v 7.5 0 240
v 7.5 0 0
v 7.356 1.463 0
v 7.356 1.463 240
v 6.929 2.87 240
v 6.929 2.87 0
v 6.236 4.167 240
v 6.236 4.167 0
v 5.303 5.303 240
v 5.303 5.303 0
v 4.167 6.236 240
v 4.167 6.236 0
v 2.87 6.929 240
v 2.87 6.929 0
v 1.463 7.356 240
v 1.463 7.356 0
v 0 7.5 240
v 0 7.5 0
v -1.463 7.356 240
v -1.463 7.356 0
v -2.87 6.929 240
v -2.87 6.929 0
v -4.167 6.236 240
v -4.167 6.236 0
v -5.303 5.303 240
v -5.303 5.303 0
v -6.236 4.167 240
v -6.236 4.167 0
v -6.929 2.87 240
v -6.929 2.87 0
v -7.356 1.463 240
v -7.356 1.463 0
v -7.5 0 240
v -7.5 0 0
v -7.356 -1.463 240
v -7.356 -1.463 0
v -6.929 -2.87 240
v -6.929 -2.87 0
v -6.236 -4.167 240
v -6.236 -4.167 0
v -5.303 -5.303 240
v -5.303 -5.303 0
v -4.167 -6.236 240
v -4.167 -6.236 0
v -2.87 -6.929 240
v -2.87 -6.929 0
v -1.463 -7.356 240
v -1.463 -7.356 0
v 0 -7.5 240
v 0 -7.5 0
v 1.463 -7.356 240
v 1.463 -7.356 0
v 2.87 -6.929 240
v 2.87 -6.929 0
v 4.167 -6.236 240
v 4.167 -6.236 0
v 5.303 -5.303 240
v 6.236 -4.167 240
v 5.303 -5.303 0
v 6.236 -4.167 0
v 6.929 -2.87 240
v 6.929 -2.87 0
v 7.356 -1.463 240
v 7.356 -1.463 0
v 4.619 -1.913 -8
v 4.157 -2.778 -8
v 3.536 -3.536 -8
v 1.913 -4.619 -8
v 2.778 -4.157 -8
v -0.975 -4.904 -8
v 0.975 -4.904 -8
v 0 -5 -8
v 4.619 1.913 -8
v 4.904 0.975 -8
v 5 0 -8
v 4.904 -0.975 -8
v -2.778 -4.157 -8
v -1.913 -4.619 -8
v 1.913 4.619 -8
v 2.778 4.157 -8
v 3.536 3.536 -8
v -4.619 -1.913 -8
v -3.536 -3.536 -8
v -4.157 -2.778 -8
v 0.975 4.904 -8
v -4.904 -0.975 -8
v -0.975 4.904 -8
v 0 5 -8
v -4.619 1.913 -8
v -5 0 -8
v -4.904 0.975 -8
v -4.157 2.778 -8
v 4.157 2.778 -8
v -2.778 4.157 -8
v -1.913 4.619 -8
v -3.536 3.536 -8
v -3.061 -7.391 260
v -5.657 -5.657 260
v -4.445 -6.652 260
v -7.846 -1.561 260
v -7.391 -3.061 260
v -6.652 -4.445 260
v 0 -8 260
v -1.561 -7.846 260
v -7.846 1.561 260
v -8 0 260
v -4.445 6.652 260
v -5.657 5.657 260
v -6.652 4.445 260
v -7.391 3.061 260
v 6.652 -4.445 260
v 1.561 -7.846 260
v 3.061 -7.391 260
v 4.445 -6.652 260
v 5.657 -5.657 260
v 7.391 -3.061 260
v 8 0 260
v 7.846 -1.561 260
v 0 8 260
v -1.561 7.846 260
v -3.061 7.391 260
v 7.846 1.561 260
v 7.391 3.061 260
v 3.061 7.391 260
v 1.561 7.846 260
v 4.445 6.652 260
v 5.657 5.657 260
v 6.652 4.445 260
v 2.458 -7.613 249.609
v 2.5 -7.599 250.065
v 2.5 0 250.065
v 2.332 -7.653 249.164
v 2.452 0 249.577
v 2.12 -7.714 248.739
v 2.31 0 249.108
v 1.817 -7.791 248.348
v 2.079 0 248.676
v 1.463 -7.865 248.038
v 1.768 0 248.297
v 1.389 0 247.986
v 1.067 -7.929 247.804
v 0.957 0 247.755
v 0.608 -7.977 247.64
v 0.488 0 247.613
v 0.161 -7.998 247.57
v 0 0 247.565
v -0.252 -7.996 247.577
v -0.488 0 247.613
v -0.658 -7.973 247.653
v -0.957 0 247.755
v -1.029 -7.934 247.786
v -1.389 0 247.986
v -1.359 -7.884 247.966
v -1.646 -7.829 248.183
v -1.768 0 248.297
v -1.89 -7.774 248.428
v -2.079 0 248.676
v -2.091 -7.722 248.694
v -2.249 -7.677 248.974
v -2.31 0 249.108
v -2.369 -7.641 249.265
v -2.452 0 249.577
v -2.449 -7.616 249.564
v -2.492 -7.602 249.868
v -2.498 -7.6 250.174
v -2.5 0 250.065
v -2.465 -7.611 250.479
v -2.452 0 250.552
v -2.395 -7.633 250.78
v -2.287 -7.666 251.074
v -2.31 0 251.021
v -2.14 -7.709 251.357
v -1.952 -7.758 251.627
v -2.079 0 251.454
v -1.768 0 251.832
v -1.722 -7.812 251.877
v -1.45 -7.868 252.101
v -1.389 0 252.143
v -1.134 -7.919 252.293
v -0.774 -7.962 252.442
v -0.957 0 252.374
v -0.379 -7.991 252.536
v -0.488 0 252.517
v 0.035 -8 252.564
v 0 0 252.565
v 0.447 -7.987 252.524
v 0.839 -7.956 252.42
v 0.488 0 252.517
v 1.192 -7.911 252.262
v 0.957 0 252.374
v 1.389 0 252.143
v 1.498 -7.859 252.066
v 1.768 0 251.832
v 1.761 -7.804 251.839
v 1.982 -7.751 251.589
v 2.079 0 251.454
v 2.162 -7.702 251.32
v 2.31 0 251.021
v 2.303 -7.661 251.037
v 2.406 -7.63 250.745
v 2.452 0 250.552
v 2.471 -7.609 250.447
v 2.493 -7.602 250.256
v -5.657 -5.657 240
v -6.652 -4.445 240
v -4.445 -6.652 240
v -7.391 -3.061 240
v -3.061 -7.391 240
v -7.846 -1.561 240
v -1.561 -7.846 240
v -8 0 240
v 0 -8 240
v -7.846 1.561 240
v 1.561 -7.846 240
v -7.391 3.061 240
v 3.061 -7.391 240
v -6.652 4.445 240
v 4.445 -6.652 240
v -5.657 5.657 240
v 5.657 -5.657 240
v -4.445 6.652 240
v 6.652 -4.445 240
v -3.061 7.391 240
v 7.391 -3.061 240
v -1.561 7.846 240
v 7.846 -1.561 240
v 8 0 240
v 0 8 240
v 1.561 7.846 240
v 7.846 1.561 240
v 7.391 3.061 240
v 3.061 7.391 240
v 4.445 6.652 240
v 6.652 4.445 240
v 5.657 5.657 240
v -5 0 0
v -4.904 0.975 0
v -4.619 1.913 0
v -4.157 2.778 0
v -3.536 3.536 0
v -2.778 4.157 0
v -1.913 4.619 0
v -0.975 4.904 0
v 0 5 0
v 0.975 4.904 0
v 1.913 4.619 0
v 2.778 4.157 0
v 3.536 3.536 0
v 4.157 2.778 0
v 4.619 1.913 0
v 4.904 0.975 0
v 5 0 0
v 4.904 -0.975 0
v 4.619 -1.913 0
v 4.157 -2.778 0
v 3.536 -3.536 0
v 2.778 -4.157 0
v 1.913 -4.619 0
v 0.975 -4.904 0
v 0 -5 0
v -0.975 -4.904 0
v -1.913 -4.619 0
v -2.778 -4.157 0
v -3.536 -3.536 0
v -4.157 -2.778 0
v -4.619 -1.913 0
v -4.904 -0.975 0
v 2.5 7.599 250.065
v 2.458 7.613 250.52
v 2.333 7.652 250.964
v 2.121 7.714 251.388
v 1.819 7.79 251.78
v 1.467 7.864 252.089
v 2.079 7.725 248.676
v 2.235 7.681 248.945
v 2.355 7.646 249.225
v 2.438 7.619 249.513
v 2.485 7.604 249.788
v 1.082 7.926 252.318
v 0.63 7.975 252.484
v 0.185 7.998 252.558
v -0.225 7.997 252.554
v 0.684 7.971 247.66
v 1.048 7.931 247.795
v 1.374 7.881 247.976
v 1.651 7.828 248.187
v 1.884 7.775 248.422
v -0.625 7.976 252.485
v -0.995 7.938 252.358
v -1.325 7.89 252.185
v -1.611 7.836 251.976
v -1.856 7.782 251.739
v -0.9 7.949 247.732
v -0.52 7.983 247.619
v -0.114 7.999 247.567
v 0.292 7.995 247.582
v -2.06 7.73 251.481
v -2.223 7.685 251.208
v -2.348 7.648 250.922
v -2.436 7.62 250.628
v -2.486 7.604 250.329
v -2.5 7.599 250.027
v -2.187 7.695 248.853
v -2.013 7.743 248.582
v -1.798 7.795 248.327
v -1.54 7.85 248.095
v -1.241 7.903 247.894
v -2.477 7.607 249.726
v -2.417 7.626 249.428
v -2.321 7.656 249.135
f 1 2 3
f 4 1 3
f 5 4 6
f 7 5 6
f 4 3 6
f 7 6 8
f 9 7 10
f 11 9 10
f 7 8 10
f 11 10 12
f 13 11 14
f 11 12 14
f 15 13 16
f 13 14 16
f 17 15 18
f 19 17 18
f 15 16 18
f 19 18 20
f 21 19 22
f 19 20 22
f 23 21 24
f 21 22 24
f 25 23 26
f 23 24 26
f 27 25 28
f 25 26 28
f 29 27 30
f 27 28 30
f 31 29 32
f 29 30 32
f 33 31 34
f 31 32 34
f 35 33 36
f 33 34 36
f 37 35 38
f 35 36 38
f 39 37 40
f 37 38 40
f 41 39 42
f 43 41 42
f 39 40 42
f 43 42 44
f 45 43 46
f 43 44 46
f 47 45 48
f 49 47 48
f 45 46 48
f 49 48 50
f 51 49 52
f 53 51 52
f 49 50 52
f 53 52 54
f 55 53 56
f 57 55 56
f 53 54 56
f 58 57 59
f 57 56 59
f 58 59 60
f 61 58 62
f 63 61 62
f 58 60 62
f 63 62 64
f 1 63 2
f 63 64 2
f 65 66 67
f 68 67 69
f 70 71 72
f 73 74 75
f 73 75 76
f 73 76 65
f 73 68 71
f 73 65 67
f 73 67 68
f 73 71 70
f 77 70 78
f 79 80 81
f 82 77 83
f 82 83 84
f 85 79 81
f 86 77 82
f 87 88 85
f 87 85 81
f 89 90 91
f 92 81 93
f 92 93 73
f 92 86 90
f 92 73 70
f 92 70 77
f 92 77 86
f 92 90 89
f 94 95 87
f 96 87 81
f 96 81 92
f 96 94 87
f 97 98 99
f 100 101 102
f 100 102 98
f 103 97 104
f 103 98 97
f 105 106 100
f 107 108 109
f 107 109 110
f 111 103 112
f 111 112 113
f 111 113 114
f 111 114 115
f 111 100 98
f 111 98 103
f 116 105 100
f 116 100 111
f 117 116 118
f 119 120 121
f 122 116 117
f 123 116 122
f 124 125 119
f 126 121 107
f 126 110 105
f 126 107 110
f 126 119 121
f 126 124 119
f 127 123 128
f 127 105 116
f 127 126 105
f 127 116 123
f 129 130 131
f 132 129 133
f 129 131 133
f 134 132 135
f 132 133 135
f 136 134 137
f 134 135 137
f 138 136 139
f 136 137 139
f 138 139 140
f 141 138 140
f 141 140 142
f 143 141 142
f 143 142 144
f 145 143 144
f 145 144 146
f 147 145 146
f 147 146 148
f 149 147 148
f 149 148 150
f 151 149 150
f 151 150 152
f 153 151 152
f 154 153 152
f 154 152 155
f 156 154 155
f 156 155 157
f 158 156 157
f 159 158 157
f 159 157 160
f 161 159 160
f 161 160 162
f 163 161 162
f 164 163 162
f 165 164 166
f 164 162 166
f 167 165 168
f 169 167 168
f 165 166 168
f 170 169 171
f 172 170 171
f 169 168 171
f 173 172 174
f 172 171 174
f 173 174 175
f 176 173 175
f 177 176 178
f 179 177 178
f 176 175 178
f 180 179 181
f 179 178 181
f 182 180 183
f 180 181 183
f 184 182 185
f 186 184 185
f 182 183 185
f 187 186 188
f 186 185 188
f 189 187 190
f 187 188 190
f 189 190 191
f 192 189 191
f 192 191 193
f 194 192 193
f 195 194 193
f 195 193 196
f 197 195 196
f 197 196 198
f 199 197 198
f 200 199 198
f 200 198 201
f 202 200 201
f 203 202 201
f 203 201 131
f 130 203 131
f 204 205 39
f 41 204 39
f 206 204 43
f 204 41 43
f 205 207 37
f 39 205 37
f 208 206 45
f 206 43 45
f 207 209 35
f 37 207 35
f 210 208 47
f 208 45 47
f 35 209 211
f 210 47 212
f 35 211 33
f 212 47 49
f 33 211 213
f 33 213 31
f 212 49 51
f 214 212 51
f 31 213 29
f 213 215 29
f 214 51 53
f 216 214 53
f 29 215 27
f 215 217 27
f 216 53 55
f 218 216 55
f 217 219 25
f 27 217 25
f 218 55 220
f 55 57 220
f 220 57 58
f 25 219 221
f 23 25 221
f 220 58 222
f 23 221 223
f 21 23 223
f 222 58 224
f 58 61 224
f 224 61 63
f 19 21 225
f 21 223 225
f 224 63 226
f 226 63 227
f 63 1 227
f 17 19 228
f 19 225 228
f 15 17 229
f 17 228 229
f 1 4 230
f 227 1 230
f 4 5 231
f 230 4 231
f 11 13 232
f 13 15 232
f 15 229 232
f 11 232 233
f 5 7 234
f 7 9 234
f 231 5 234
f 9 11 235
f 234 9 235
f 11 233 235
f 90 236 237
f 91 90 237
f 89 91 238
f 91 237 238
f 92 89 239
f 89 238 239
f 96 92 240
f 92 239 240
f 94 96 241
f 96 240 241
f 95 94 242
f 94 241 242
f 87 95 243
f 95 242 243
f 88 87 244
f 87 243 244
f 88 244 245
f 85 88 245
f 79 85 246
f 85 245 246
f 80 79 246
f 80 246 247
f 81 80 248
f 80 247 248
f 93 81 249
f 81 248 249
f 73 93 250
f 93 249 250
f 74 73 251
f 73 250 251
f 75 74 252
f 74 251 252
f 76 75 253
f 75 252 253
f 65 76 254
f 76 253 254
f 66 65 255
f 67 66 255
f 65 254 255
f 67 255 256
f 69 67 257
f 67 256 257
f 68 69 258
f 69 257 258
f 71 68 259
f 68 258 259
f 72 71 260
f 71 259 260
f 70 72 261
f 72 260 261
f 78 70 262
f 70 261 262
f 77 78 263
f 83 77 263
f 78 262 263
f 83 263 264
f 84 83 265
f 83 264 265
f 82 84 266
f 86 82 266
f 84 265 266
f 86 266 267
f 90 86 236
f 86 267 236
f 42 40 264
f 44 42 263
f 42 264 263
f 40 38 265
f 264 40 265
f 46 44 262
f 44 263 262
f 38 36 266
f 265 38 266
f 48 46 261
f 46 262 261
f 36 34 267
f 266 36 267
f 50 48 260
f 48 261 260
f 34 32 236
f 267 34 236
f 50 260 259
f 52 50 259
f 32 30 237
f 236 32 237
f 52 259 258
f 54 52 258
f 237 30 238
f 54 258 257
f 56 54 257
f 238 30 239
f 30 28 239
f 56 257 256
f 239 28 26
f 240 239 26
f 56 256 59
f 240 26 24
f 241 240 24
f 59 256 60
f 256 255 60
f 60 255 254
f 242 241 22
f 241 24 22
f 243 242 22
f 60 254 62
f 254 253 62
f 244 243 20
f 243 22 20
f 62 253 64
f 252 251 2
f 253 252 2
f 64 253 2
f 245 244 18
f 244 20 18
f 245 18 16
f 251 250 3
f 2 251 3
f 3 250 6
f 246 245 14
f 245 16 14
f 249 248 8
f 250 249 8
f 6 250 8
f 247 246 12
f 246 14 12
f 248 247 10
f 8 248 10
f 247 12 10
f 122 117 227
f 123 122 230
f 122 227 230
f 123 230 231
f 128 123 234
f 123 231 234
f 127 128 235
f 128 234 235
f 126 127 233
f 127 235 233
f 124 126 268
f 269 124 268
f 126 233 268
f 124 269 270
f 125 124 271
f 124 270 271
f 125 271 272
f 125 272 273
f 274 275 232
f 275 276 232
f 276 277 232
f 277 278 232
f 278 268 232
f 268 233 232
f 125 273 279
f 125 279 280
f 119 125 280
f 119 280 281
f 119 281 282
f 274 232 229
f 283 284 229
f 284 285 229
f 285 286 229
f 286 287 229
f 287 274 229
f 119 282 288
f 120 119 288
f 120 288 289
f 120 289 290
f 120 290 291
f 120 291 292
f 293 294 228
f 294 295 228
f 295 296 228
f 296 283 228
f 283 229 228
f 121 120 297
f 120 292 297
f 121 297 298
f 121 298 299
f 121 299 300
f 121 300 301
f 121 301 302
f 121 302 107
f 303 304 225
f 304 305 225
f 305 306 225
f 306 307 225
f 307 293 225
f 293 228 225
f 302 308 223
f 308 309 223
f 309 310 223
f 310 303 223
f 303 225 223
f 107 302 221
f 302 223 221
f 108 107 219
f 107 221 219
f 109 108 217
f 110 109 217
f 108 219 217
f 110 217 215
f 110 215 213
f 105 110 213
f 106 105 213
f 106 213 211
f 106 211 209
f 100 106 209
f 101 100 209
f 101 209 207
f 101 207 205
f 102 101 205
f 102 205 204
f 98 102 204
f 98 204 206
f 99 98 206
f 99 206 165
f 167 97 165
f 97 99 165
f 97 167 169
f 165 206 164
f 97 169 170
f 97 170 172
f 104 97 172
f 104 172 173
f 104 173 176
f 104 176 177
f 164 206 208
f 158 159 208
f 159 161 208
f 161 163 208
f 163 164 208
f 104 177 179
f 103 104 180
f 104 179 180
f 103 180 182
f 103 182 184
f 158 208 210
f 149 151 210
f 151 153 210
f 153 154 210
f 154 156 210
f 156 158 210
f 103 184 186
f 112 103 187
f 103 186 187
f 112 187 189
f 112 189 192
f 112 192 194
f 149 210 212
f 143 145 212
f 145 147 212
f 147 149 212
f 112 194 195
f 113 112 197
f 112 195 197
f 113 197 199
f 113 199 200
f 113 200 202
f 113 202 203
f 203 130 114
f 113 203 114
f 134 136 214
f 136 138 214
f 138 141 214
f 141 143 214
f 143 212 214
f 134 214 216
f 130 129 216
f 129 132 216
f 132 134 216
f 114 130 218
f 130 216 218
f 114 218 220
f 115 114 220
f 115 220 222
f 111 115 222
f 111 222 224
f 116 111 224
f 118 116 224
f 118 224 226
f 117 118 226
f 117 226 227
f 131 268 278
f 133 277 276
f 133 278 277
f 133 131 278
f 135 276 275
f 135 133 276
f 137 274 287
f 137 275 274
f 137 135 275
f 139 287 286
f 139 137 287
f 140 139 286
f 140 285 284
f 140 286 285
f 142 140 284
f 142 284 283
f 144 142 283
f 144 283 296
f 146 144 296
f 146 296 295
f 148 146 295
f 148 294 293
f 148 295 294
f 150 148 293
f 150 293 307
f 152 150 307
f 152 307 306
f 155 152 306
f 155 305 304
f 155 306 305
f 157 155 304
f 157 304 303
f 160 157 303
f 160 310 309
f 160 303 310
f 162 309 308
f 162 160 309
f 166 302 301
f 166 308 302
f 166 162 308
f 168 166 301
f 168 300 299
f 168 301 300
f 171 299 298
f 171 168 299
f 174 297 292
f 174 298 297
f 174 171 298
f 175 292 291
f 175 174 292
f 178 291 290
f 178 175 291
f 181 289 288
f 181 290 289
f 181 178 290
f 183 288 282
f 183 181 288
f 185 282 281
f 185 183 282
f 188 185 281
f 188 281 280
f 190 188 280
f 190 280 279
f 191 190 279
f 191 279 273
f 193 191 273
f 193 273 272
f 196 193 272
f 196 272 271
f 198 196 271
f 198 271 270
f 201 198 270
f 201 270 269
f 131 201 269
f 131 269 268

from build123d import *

# Parameters (mm, degrees)
SKETCH1_R               = 7.5
BOSS_EXTRUDE1_DEPTH     = 240
SKETCH5_R               = 8
BOSS_EXTRUDE2_DEPTH     = 20
SKETCH8_R               = 5
BOSS_EXTRUDE4_DEPTH     = 8
CUT_EXTRUDE3_DEPTH      = 8
CUT_EXTRUDE3_DEPTH_BACK = 8
SKETCH9_R               = 2.5


with BuildPart() as part:
    # Sketch1 → Boss-Extrude1 (new body)
    with BuildSketch(Plane.XY):
        Circle(SKETCH1_R)
    extrude(amount=BOSS_EXTRUDE1_DEPTH)

    # Sketch5 → Boss-Extrude2 (add)
    with BuildSketch(Plane.XY.offset(240)):
        Circle(SKETCH5_R)
    extrude(amount=BOSS_EXTRUDE2_DEPTH)

    # Sketch8 → Boss-Extrude4 (add)
    with BuildSketch(Plane(origin=(0, 0, 0), x_dir=(-1, 0, 0), z_dir=(0, 0, -1))):
        Circle(SKETCH8_R)
    extrude(amount=BOSS_EXTRUDE4_DEPTH)

    # Sketch9 → Cut-Extrude3 (cut, two sides: drawn at the far end of the back side and taken through both)
    with BuildSketch(Plane(origin=(0, 0, 0), x_dir=(1, 0, 0), z_dir=(0, 1, 0)).offset(-CUT_EXTRUDE3_DEPTH_BACK)):
        with Locations((0, -250.064612311)):
            Circle(SKETCH9_R)
    extrude(amount=CUT_EXTRUDE3_DEPTH + CUT_EXTRUDE3_DEPTH_BACK, mode=Mode.SUBTRACT)


solid = part.part
